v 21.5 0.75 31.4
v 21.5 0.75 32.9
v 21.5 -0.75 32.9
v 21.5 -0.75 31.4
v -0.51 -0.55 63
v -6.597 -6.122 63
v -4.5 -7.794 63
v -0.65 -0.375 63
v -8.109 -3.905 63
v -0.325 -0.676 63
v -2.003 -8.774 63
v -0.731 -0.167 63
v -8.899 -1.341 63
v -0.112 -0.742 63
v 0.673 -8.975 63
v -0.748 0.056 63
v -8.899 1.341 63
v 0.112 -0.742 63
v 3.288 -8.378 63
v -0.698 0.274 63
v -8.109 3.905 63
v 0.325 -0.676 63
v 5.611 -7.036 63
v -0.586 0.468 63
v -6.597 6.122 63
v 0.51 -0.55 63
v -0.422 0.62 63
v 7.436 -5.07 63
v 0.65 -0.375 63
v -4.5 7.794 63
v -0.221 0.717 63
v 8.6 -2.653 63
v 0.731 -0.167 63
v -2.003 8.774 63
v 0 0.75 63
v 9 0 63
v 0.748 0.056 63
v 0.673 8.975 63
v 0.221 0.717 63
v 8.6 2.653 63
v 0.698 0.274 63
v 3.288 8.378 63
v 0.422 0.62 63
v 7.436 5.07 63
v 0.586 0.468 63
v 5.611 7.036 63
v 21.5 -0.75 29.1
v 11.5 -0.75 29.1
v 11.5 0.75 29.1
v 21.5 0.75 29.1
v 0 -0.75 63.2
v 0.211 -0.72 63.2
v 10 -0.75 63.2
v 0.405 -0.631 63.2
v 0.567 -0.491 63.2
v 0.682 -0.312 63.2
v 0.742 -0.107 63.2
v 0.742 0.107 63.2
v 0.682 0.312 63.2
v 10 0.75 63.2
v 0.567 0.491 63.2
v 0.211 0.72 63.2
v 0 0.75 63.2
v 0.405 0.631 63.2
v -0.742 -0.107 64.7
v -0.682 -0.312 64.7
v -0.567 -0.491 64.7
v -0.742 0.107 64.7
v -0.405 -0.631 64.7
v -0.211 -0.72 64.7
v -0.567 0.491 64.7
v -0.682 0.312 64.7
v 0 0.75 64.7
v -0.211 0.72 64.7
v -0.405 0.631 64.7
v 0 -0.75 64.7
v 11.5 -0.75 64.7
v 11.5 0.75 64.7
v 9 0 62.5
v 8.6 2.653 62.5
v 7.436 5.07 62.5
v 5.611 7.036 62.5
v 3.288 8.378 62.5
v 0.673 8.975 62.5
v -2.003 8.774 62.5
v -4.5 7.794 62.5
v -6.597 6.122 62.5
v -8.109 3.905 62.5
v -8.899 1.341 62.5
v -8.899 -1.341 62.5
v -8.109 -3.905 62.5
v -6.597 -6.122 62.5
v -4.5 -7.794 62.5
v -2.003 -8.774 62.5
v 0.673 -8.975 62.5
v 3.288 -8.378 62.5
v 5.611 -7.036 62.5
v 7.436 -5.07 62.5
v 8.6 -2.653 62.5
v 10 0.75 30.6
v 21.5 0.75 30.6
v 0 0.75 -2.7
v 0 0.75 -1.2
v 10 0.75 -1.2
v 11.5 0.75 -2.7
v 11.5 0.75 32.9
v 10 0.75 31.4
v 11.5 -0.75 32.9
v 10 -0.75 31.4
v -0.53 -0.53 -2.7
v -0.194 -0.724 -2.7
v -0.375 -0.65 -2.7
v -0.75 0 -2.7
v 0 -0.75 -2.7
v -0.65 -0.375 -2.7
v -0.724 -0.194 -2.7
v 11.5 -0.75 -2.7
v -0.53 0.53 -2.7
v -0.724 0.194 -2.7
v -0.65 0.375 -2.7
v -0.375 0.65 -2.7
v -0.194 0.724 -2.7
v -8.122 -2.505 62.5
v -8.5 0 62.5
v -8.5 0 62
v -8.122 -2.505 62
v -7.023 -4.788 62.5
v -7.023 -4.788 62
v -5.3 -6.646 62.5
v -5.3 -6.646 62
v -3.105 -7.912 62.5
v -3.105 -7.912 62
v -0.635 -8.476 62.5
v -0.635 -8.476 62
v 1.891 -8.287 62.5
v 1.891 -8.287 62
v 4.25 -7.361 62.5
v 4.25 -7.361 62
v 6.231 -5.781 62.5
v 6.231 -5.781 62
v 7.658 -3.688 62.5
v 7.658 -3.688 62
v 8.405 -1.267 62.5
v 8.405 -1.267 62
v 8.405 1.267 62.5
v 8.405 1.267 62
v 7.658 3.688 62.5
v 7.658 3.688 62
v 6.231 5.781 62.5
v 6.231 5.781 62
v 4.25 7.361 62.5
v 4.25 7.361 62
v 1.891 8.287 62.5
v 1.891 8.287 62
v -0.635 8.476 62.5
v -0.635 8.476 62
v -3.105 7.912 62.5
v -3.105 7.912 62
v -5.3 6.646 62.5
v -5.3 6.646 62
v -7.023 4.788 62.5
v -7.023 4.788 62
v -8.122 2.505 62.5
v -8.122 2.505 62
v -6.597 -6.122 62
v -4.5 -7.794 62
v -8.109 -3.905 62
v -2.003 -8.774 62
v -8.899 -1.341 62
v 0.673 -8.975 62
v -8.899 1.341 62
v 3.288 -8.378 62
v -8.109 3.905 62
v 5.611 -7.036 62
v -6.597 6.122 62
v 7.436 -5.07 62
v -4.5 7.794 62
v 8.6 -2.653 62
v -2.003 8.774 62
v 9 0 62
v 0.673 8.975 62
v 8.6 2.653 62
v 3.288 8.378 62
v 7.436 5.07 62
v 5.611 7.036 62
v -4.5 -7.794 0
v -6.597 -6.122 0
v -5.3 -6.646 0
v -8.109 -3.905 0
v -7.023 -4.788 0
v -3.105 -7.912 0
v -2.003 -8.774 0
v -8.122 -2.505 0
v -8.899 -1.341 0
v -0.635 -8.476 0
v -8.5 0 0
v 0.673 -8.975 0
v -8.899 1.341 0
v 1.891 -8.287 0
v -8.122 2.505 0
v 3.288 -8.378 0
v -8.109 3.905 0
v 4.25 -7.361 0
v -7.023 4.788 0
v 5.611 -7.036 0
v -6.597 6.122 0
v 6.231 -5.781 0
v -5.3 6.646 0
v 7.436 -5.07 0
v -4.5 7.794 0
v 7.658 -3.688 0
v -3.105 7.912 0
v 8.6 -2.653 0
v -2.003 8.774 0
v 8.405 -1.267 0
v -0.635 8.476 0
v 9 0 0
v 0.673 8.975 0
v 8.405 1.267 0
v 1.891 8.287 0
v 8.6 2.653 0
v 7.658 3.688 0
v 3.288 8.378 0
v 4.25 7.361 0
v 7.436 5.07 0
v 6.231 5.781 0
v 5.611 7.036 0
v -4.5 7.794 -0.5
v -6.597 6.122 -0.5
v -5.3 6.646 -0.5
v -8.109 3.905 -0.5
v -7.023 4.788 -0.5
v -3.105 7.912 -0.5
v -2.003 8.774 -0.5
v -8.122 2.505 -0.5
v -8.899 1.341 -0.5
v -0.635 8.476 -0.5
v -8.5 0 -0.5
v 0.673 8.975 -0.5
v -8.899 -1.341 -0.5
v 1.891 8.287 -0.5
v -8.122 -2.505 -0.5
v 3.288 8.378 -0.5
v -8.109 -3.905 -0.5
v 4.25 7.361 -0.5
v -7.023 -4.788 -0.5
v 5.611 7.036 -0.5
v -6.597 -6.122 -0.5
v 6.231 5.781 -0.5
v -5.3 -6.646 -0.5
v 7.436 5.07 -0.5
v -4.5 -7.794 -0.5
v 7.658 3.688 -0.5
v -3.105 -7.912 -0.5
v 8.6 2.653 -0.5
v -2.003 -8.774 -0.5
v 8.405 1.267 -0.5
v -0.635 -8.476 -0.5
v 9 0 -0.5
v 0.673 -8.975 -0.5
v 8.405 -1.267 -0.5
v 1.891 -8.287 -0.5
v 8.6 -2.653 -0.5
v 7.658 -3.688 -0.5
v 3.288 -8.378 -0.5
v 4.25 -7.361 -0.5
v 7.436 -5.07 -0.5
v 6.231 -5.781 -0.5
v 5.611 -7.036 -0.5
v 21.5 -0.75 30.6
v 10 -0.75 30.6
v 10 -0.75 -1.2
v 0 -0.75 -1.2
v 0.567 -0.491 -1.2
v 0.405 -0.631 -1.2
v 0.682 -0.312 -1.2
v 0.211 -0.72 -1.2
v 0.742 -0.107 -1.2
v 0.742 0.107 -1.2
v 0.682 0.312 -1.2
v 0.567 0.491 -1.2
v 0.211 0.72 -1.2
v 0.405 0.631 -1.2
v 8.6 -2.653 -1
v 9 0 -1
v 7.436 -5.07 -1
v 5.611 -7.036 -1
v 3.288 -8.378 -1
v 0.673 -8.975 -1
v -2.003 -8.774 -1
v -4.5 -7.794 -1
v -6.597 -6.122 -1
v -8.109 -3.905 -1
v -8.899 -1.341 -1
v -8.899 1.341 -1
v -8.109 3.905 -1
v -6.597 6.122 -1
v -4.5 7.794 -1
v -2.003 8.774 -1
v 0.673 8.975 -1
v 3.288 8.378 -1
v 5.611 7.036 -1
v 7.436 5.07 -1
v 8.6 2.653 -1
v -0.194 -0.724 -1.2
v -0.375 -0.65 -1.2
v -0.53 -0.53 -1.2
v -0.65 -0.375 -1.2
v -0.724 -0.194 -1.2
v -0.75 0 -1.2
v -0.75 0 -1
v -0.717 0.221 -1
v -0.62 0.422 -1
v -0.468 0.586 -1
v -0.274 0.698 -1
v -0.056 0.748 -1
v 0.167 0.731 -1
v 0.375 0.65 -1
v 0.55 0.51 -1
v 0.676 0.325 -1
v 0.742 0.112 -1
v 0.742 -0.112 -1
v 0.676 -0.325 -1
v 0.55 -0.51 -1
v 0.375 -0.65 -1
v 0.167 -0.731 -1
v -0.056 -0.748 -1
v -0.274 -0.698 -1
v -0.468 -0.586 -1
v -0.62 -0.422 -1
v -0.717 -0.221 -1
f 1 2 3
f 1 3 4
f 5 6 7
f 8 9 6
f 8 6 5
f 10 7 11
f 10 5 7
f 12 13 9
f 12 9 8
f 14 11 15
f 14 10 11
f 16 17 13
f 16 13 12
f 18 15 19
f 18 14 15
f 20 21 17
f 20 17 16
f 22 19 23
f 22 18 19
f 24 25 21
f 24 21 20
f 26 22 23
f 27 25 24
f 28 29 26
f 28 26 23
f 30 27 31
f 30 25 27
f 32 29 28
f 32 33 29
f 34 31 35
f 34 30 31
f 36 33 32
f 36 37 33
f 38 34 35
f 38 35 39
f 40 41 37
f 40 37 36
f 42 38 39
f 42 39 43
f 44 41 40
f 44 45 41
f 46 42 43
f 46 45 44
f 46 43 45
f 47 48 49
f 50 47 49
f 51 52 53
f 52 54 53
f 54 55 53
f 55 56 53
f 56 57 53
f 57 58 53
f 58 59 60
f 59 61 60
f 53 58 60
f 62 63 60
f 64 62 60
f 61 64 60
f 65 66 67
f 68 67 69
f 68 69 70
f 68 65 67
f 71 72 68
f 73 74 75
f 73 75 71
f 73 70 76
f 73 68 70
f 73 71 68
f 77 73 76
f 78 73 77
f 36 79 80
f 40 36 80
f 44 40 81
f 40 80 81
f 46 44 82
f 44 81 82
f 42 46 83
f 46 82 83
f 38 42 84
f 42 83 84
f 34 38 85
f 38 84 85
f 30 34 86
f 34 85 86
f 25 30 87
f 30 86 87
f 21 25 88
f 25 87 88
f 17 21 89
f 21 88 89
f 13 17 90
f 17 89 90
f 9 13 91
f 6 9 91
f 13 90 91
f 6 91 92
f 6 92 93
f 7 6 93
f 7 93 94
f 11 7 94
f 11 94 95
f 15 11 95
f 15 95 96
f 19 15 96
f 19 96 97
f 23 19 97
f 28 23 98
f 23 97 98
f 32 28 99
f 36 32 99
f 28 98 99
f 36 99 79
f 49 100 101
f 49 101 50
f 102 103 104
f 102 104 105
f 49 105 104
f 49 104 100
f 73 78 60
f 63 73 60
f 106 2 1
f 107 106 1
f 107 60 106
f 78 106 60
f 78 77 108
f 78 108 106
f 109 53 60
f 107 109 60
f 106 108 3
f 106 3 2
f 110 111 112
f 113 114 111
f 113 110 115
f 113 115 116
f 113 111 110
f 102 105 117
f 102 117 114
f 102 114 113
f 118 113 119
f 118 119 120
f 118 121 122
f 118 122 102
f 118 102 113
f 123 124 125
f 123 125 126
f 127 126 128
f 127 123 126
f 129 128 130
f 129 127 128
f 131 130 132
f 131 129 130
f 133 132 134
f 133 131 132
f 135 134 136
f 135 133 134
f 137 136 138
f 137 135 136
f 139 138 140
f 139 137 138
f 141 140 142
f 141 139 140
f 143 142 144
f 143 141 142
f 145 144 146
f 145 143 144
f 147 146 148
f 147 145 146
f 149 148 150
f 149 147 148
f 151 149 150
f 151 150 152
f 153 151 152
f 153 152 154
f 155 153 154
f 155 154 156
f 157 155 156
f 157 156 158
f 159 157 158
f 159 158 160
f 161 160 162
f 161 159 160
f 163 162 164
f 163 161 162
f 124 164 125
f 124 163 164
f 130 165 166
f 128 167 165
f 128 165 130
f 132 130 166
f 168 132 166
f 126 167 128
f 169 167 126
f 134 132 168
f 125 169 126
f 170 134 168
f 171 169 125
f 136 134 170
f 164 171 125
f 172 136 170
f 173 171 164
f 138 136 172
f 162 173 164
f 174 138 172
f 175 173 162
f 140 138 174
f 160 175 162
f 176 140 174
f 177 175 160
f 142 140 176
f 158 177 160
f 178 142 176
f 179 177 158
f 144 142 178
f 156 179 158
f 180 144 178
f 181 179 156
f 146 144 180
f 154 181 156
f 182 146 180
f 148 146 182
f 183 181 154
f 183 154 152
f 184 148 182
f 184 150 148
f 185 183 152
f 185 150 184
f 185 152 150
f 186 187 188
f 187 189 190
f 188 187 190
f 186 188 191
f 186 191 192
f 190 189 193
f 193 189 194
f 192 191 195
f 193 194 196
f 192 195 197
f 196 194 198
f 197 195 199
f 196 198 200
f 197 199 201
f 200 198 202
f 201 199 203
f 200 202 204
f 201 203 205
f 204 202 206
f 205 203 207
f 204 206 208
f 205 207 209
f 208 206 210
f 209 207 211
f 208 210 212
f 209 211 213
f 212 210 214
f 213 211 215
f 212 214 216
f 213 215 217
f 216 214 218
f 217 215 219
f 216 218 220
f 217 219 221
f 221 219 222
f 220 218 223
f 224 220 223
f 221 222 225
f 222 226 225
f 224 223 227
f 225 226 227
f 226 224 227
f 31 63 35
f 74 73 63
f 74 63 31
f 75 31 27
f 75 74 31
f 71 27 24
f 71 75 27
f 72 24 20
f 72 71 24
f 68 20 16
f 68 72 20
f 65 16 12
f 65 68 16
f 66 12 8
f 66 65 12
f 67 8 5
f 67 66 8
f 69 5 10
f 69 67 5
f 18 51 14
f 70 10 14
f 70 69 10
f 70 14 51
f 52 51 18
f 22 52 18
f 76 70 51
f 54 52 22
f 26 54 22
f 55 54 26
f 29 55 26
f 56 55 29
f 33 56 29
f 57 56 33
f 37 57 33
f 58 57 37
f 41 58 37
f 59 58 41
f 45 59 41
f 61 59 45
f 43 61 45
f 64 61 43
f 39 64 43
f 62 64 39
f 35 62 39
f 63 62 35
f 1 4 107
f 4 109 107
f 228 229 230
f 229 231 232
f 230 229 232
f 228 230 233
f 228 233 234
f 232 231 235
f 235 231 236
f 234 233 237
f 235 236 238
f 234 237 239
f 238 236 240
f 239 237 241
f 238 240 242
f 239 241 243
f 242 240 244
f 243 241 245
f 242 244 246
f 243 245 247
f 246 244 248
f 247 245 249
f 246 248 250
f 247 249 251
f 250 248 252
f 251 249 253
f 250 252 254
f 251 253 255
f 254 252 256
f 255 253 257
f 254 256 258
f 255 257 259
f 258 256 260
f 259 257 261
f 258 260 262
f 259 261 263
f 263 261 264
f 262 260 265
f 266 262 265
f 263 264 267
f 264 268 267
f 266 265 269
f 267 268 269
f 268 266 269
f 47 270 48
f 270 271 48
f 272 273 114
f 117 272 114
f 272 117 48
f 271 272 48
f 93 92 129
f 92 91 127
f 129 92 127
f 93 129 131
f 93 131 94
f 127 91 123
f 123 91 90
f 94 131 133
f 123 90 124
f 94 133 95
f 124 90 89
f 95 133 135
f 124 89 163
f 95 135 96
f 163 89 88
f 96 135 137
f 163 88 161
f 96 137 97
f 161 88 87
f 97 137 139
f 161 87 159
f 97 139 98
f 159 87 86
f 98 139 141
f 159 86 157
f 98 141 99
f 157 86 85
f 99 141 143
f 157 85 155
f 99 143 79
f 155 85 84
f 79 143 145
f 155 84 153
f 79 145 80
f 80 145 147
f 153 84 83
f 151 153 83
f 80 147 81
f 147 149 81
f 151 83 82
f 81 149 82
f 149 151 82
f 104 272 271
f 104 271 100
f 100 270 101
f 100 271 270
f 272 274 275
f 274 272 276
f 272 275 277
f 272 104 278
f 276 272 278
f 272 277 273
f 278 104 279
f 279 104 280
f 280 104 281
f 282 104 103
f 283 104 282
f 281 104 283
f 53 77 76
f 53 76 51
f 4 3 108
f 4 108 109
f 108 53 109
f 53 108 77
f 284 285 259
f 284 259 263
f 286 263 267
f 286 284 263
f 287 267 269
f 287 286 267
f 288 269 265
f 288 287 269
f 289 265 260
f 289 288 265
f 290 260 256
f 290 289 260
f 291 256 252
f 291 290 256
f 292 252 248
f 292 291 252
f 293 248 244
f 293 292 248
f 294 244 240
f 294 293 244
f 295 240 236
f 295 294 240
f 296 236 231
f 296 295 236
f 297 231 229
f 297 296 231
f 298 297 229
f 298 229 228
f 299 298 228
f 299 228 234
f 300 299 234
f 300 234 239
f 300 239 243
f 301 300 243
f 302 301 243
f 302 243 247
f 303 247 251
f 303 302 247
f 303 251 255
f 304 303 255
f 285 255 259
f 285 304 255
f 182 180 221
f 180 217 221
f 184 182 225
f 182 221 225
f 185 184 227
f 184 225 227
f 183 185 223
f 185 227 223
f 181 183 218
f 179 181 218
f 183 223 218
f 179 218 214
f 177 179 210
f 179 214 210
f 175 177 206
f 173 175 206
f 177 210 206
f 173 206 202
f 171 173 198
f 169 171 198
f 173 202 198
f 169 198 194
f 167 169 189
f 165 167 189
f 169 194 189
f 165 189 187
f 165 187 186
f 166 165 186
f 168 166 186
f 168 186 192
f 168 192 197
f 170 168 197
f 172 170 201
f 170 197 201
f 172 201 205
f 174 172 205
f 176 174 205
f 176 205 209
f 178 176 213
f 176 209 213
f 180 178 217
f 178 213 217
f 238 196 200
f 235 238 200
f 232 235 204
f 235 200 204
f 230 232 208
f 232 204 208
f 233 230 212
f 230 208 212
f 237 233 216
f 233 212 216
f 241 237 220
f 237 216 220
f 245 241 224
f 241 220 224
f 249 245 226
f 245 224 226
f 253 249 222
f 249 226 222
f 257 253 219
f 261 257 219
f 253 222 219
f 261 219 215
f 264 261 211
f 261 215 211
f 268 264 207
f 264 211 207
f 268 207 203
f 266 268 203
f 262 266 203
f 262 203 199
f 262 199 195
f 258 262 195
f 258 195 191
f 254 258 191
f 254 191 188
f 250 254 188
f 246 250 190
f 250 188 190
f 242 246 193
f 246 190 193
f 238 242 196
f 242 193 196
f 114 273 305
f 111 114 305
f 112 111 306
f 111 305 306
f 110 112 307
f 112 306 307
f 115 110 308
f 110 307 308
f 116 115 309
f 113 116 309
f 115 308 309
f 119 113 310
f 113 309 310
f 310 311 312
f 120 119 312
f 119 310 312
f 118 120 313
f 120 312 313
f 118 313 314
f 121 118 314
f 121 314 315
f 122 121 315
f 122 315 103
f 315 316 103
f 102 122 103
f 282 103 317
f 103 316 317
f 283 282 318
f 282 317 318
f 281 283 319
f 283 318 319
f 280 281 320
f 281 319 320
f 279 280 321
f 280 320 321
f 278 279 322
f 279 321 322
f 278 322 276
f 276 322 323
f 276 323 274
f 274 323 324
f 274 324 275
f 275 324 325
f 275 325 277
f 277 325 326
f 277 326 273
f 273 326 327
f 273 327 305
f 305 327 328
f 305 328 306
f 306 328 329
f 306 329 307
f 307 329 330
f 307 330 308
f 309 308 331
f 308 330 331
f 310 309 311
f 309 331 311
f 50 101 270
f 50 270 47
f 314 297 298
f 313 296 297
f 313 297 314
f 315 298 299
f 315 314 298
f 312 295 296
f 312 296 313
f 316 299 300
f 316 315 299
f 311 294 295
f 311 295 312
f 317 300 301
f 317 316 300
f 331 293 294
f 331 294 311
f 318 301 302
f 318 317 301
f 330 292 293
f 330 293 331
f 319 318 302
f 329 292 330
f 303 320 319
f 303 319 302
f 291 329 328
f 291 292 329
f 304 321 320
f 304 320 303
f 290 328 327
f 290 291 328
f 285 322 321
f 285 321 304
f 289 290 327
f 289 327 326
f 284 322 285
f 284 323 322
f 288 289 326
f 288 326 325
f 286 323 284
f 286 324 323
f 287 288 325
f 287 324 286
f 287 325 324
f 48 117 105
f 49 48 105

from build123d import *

# Parameters (mm, degrees)
ESQUISSE1_R         = 9
BOSS_EXTRU_1_DEPTH  = 31
ESQUISSE3_R         = 8.5
BOSS_EXTRU_2_DEPTH  = 0.5
BOSS_EXTRU_3_START  = 0.5
ESQUISSE4_R         = 9
BOSS_EXTRU_3_DEPTH  = 0.5
ESQUISSE5_R         = 0.75
BOSS_EXTRU_4_DEPTH  = 0.2
BOSS_EXTRU_5_DEPTH  = 1.5
ESQUISSE7_W         = 1.5
ESQUISSE7_H         = 1.5
BOSS_EXTRU_6_DEPTH  = 31.8
ESQUISSE8_W         = 1.5
ESQUISSE8_H         = 1.5
BOSS_EXTRU_7_DEPTH  = 10
ESQUISSE10_R        = 9
BOSS_EXTRU_8_DEPTH  = 31
BOSS_EXTRU_9_START  = 0.5
ESQUISSE11_R        = 8.5
BOSS_EXTRU_9_DEPTH  = 0.5
ESQUISSE12_R        = 9
BOSS_EXTRU_10_DEPTH = 0.5
BOSS_EXTRU_11_START = 0.2
ESQUISSE13_R        = 0.75
BOSS_EXTRU_11_DEPTH = 0.2
BOSS_EXTRU_12_START = 1.5
BOSS_EXTRU_12_DEPTH = 1.5
ESQUISSE16_W        = 1.5
ESQUISSE16_H        = 1.5
BOSS_EXTRU_13_DEPTH = 31.8
ESQUISSE17_W        = 1.5
ESQUISSE17_H        = 1.5
BOSS_EXTRU_14_DEPTH = 10


with BuildPart() as part:
    # Esquisse1 → Boss.-Extru.1 (new body)
    with BuildSketch(Plane.XY):
        Circle(ESQUISSE1_R)
    extrude(amount=BOSS_EXTRU_1_DEPTH)

    # Esquisse3 → Boss.-Extru.2 (add)
    with BuildSketch(Plane(origin=(0, 0, 0), x_dir=(-1, 0, 0), z_dir=(0, 0, -1))):
        Circle(ESQUISSE3_R)
    extrude(amount=BOSS_EXTRU_2_DEPTH)

    # Esquisse4 → Boss.-Extru.3 (add)
    with BuildSketch(Plane(origin=(0, 0, -0.5), x_dir=(-1, 0, 0), z_dir=(0, 0, -1)).offset(BOSS_EXTRU_3_START)):
        with Locations(Location((0, 0, 0), (0, 0, 180))):
            Circle(ESQUISSE4_R)
    extrude(amount=-BOSS_EXTRU_3_DEPTH)

    # Esquisse5 → Boss.-Extru.4 (add)
    with BuildSketch(Plane(origin=(0, 0, -1), x_dir=(-1, 0, 0), z_dir=(0, 0, -1))):
        Circle(ESQUISSE5_R)
    extrude(amount=BOSS_EXTRU_4_DEPTH)

    # Esquisse6 → Boss.-Extru.5 (add)
    with BuildSketch(Plane(origin=(0, 0, -1.2), x_dir=(-1, 0, 0), z_dir=(0, 0, -1))):
        with BuildLine():
            Line((-11.5, -0.75), (0, -0.75))
            ThreePointArc((0, -0.75), (-0.75, 0), (0, 0.75))
            Line((0, 0.75), (-11.5, 0.75))
            Line((-11.5, 0.75), (-11.5, -0.75))
        make_face()
        with BuildLine():
            ThreePointArc((0, 0.75), (-0.75, 0), (0, -0.75))
            Line((0, -0.75), (0, 0.75))
        make_face()
        with BuildLine():
            Line((0, 0.75), (0, -0.75))
            ThreePointArc((0, -0.75), (0.530330086, -0.530330086), (0.75, 0))
            ThreePointArc((0.75, 0), (0.530330086, 0.530330086), (0, 0.75))
        make_face()
    extrude(amount=BOSS_EXTRU_5_DEPTH)

    # Esquisse7 → Boss.-Extru.6 (add)
    with BuildSketch(Plane.XY.offset(-1.2)):
        with Locations((10.75, 0)):
            Rectangle(ESQUISSE7_W, ESQUISSE7_H)
    extrude(amount=BOSS_EXTRU_6_DEPTH)

    # Esquisse8 → Boss.-Extru.7 (add)
    with BuildSketch(Plane(origin=(11.5, 0, 0), x_dir=(0, 0, -1), z_dir=(1, 0, 0))):
        with Locations((-29.85, 0)):
            Rectangle(ESQUISSE8_W, ESQUISSE8_H)
    extrude(amount=BOSS_EXTRU_7_DEPTH)

    # Esquisse10 → Boss.-Extru.8 (add)
    with BuildSketch(Plane.XY.offset(31)):
        Circle(ESQUISSE10_R)
    extrude(amount=BOSS_EXTRU_8_DEPTH)

    # Esquisse11 → Boss.-Extru.9 (add)
    with BuildSketch(Plane.XY.offset(62).offset(BOSS_EXTRU_9_START)):
        with Locations(Location((0, 0, 0), (0, 0, 180))):
            Circle(ESQUISSE11_R)
    extrude(amount=-BOSS_EXTRU_9_DEPTH)

    # Esquisse12 → Boss.-Extru.10 (add)
    with BuildSketch(Plane.XY.offset(62.5)):
        Circle(ESQUISSE12_R)
    extrude(amount=BOSS_EXTRU_10_DEPTH)

    # Esquisse13 → Boss.-Extru.11 (add)
    with BuildSketch(Plane.XY.offset(63).offset(BOSS_EXTRU_11_START)):
        with Locations(Location((0, 0, 0), (0, 0, 90))):
            Circle(ESQUISSE13_R)
    extrude(amount=-BOSS_EXTRU_11_DEPTH)

    # Esquisse15 → Boss.-Extru.12 (add)
    with BuildSketch(Plane.XY.offset(63.2).offset(BOSS_EXTRU_12_START)):
        with BuildLine():
            ThreePointArc((0.75, 0), (0.530330086, -0.530330086), (0, -0.75))
            Line((0, -0.75), (11.5, -0.75))
            Line((11.5, -0.75), (11.5, 0.75))
            Line((11.5, 0.75), (0, 0.75))
            ThreePointArc((0, 0.75), (0.530330086, 0.530330086), (0.75, 0))
        make_face()
        with BuildLine():
            ThreePointArc((0, 0.75), (-0.75, 0), (0, -0.75))
            Line((0, -0.75), (0, 0.75))
        make_face()
        with BuildLine():
            Line((0, 0.75), (0, -0.75))
            ThreePointArc((0, -0.75), (0.530330086, -0.530330086), (0.75, 0))
            ThreePointArc((0.75, 0), (0.530330086, 0.530330086), (0, 0.75))
        make_face()
    extrude(amount=-BOSS_EXTRU_12_DEPTH)

    # Esquisse16 → Boss.-Extru.13 (add)
    with BuildSketch(Plane(origin=(0, 0, 63.2), x_dir=(-1, 0, 0), z_dir=(0, 0, -1))):
        with Locations((-10.75, 0)):
            Rectangle(ESQUISSE16_W, ESQUISSE16_H)
    extrude(amount=BOSS_EXTRU_13_DEPTH)

    # Esquisse17 → Boss.-Extru.14 (add)
    with BuildSketch(Plane(origin=(11.5, 0, 0), x_dir=(0, 0, -1), z_dir=(1, 0, 0))):
        with Locations((-32.15, 0)):
            Rectangle(ESQUISSE17_W, ESQUISSE17_H)
    extrude(amount=BOSS_EXTRU_14_DEPTH)


solid = part.part
